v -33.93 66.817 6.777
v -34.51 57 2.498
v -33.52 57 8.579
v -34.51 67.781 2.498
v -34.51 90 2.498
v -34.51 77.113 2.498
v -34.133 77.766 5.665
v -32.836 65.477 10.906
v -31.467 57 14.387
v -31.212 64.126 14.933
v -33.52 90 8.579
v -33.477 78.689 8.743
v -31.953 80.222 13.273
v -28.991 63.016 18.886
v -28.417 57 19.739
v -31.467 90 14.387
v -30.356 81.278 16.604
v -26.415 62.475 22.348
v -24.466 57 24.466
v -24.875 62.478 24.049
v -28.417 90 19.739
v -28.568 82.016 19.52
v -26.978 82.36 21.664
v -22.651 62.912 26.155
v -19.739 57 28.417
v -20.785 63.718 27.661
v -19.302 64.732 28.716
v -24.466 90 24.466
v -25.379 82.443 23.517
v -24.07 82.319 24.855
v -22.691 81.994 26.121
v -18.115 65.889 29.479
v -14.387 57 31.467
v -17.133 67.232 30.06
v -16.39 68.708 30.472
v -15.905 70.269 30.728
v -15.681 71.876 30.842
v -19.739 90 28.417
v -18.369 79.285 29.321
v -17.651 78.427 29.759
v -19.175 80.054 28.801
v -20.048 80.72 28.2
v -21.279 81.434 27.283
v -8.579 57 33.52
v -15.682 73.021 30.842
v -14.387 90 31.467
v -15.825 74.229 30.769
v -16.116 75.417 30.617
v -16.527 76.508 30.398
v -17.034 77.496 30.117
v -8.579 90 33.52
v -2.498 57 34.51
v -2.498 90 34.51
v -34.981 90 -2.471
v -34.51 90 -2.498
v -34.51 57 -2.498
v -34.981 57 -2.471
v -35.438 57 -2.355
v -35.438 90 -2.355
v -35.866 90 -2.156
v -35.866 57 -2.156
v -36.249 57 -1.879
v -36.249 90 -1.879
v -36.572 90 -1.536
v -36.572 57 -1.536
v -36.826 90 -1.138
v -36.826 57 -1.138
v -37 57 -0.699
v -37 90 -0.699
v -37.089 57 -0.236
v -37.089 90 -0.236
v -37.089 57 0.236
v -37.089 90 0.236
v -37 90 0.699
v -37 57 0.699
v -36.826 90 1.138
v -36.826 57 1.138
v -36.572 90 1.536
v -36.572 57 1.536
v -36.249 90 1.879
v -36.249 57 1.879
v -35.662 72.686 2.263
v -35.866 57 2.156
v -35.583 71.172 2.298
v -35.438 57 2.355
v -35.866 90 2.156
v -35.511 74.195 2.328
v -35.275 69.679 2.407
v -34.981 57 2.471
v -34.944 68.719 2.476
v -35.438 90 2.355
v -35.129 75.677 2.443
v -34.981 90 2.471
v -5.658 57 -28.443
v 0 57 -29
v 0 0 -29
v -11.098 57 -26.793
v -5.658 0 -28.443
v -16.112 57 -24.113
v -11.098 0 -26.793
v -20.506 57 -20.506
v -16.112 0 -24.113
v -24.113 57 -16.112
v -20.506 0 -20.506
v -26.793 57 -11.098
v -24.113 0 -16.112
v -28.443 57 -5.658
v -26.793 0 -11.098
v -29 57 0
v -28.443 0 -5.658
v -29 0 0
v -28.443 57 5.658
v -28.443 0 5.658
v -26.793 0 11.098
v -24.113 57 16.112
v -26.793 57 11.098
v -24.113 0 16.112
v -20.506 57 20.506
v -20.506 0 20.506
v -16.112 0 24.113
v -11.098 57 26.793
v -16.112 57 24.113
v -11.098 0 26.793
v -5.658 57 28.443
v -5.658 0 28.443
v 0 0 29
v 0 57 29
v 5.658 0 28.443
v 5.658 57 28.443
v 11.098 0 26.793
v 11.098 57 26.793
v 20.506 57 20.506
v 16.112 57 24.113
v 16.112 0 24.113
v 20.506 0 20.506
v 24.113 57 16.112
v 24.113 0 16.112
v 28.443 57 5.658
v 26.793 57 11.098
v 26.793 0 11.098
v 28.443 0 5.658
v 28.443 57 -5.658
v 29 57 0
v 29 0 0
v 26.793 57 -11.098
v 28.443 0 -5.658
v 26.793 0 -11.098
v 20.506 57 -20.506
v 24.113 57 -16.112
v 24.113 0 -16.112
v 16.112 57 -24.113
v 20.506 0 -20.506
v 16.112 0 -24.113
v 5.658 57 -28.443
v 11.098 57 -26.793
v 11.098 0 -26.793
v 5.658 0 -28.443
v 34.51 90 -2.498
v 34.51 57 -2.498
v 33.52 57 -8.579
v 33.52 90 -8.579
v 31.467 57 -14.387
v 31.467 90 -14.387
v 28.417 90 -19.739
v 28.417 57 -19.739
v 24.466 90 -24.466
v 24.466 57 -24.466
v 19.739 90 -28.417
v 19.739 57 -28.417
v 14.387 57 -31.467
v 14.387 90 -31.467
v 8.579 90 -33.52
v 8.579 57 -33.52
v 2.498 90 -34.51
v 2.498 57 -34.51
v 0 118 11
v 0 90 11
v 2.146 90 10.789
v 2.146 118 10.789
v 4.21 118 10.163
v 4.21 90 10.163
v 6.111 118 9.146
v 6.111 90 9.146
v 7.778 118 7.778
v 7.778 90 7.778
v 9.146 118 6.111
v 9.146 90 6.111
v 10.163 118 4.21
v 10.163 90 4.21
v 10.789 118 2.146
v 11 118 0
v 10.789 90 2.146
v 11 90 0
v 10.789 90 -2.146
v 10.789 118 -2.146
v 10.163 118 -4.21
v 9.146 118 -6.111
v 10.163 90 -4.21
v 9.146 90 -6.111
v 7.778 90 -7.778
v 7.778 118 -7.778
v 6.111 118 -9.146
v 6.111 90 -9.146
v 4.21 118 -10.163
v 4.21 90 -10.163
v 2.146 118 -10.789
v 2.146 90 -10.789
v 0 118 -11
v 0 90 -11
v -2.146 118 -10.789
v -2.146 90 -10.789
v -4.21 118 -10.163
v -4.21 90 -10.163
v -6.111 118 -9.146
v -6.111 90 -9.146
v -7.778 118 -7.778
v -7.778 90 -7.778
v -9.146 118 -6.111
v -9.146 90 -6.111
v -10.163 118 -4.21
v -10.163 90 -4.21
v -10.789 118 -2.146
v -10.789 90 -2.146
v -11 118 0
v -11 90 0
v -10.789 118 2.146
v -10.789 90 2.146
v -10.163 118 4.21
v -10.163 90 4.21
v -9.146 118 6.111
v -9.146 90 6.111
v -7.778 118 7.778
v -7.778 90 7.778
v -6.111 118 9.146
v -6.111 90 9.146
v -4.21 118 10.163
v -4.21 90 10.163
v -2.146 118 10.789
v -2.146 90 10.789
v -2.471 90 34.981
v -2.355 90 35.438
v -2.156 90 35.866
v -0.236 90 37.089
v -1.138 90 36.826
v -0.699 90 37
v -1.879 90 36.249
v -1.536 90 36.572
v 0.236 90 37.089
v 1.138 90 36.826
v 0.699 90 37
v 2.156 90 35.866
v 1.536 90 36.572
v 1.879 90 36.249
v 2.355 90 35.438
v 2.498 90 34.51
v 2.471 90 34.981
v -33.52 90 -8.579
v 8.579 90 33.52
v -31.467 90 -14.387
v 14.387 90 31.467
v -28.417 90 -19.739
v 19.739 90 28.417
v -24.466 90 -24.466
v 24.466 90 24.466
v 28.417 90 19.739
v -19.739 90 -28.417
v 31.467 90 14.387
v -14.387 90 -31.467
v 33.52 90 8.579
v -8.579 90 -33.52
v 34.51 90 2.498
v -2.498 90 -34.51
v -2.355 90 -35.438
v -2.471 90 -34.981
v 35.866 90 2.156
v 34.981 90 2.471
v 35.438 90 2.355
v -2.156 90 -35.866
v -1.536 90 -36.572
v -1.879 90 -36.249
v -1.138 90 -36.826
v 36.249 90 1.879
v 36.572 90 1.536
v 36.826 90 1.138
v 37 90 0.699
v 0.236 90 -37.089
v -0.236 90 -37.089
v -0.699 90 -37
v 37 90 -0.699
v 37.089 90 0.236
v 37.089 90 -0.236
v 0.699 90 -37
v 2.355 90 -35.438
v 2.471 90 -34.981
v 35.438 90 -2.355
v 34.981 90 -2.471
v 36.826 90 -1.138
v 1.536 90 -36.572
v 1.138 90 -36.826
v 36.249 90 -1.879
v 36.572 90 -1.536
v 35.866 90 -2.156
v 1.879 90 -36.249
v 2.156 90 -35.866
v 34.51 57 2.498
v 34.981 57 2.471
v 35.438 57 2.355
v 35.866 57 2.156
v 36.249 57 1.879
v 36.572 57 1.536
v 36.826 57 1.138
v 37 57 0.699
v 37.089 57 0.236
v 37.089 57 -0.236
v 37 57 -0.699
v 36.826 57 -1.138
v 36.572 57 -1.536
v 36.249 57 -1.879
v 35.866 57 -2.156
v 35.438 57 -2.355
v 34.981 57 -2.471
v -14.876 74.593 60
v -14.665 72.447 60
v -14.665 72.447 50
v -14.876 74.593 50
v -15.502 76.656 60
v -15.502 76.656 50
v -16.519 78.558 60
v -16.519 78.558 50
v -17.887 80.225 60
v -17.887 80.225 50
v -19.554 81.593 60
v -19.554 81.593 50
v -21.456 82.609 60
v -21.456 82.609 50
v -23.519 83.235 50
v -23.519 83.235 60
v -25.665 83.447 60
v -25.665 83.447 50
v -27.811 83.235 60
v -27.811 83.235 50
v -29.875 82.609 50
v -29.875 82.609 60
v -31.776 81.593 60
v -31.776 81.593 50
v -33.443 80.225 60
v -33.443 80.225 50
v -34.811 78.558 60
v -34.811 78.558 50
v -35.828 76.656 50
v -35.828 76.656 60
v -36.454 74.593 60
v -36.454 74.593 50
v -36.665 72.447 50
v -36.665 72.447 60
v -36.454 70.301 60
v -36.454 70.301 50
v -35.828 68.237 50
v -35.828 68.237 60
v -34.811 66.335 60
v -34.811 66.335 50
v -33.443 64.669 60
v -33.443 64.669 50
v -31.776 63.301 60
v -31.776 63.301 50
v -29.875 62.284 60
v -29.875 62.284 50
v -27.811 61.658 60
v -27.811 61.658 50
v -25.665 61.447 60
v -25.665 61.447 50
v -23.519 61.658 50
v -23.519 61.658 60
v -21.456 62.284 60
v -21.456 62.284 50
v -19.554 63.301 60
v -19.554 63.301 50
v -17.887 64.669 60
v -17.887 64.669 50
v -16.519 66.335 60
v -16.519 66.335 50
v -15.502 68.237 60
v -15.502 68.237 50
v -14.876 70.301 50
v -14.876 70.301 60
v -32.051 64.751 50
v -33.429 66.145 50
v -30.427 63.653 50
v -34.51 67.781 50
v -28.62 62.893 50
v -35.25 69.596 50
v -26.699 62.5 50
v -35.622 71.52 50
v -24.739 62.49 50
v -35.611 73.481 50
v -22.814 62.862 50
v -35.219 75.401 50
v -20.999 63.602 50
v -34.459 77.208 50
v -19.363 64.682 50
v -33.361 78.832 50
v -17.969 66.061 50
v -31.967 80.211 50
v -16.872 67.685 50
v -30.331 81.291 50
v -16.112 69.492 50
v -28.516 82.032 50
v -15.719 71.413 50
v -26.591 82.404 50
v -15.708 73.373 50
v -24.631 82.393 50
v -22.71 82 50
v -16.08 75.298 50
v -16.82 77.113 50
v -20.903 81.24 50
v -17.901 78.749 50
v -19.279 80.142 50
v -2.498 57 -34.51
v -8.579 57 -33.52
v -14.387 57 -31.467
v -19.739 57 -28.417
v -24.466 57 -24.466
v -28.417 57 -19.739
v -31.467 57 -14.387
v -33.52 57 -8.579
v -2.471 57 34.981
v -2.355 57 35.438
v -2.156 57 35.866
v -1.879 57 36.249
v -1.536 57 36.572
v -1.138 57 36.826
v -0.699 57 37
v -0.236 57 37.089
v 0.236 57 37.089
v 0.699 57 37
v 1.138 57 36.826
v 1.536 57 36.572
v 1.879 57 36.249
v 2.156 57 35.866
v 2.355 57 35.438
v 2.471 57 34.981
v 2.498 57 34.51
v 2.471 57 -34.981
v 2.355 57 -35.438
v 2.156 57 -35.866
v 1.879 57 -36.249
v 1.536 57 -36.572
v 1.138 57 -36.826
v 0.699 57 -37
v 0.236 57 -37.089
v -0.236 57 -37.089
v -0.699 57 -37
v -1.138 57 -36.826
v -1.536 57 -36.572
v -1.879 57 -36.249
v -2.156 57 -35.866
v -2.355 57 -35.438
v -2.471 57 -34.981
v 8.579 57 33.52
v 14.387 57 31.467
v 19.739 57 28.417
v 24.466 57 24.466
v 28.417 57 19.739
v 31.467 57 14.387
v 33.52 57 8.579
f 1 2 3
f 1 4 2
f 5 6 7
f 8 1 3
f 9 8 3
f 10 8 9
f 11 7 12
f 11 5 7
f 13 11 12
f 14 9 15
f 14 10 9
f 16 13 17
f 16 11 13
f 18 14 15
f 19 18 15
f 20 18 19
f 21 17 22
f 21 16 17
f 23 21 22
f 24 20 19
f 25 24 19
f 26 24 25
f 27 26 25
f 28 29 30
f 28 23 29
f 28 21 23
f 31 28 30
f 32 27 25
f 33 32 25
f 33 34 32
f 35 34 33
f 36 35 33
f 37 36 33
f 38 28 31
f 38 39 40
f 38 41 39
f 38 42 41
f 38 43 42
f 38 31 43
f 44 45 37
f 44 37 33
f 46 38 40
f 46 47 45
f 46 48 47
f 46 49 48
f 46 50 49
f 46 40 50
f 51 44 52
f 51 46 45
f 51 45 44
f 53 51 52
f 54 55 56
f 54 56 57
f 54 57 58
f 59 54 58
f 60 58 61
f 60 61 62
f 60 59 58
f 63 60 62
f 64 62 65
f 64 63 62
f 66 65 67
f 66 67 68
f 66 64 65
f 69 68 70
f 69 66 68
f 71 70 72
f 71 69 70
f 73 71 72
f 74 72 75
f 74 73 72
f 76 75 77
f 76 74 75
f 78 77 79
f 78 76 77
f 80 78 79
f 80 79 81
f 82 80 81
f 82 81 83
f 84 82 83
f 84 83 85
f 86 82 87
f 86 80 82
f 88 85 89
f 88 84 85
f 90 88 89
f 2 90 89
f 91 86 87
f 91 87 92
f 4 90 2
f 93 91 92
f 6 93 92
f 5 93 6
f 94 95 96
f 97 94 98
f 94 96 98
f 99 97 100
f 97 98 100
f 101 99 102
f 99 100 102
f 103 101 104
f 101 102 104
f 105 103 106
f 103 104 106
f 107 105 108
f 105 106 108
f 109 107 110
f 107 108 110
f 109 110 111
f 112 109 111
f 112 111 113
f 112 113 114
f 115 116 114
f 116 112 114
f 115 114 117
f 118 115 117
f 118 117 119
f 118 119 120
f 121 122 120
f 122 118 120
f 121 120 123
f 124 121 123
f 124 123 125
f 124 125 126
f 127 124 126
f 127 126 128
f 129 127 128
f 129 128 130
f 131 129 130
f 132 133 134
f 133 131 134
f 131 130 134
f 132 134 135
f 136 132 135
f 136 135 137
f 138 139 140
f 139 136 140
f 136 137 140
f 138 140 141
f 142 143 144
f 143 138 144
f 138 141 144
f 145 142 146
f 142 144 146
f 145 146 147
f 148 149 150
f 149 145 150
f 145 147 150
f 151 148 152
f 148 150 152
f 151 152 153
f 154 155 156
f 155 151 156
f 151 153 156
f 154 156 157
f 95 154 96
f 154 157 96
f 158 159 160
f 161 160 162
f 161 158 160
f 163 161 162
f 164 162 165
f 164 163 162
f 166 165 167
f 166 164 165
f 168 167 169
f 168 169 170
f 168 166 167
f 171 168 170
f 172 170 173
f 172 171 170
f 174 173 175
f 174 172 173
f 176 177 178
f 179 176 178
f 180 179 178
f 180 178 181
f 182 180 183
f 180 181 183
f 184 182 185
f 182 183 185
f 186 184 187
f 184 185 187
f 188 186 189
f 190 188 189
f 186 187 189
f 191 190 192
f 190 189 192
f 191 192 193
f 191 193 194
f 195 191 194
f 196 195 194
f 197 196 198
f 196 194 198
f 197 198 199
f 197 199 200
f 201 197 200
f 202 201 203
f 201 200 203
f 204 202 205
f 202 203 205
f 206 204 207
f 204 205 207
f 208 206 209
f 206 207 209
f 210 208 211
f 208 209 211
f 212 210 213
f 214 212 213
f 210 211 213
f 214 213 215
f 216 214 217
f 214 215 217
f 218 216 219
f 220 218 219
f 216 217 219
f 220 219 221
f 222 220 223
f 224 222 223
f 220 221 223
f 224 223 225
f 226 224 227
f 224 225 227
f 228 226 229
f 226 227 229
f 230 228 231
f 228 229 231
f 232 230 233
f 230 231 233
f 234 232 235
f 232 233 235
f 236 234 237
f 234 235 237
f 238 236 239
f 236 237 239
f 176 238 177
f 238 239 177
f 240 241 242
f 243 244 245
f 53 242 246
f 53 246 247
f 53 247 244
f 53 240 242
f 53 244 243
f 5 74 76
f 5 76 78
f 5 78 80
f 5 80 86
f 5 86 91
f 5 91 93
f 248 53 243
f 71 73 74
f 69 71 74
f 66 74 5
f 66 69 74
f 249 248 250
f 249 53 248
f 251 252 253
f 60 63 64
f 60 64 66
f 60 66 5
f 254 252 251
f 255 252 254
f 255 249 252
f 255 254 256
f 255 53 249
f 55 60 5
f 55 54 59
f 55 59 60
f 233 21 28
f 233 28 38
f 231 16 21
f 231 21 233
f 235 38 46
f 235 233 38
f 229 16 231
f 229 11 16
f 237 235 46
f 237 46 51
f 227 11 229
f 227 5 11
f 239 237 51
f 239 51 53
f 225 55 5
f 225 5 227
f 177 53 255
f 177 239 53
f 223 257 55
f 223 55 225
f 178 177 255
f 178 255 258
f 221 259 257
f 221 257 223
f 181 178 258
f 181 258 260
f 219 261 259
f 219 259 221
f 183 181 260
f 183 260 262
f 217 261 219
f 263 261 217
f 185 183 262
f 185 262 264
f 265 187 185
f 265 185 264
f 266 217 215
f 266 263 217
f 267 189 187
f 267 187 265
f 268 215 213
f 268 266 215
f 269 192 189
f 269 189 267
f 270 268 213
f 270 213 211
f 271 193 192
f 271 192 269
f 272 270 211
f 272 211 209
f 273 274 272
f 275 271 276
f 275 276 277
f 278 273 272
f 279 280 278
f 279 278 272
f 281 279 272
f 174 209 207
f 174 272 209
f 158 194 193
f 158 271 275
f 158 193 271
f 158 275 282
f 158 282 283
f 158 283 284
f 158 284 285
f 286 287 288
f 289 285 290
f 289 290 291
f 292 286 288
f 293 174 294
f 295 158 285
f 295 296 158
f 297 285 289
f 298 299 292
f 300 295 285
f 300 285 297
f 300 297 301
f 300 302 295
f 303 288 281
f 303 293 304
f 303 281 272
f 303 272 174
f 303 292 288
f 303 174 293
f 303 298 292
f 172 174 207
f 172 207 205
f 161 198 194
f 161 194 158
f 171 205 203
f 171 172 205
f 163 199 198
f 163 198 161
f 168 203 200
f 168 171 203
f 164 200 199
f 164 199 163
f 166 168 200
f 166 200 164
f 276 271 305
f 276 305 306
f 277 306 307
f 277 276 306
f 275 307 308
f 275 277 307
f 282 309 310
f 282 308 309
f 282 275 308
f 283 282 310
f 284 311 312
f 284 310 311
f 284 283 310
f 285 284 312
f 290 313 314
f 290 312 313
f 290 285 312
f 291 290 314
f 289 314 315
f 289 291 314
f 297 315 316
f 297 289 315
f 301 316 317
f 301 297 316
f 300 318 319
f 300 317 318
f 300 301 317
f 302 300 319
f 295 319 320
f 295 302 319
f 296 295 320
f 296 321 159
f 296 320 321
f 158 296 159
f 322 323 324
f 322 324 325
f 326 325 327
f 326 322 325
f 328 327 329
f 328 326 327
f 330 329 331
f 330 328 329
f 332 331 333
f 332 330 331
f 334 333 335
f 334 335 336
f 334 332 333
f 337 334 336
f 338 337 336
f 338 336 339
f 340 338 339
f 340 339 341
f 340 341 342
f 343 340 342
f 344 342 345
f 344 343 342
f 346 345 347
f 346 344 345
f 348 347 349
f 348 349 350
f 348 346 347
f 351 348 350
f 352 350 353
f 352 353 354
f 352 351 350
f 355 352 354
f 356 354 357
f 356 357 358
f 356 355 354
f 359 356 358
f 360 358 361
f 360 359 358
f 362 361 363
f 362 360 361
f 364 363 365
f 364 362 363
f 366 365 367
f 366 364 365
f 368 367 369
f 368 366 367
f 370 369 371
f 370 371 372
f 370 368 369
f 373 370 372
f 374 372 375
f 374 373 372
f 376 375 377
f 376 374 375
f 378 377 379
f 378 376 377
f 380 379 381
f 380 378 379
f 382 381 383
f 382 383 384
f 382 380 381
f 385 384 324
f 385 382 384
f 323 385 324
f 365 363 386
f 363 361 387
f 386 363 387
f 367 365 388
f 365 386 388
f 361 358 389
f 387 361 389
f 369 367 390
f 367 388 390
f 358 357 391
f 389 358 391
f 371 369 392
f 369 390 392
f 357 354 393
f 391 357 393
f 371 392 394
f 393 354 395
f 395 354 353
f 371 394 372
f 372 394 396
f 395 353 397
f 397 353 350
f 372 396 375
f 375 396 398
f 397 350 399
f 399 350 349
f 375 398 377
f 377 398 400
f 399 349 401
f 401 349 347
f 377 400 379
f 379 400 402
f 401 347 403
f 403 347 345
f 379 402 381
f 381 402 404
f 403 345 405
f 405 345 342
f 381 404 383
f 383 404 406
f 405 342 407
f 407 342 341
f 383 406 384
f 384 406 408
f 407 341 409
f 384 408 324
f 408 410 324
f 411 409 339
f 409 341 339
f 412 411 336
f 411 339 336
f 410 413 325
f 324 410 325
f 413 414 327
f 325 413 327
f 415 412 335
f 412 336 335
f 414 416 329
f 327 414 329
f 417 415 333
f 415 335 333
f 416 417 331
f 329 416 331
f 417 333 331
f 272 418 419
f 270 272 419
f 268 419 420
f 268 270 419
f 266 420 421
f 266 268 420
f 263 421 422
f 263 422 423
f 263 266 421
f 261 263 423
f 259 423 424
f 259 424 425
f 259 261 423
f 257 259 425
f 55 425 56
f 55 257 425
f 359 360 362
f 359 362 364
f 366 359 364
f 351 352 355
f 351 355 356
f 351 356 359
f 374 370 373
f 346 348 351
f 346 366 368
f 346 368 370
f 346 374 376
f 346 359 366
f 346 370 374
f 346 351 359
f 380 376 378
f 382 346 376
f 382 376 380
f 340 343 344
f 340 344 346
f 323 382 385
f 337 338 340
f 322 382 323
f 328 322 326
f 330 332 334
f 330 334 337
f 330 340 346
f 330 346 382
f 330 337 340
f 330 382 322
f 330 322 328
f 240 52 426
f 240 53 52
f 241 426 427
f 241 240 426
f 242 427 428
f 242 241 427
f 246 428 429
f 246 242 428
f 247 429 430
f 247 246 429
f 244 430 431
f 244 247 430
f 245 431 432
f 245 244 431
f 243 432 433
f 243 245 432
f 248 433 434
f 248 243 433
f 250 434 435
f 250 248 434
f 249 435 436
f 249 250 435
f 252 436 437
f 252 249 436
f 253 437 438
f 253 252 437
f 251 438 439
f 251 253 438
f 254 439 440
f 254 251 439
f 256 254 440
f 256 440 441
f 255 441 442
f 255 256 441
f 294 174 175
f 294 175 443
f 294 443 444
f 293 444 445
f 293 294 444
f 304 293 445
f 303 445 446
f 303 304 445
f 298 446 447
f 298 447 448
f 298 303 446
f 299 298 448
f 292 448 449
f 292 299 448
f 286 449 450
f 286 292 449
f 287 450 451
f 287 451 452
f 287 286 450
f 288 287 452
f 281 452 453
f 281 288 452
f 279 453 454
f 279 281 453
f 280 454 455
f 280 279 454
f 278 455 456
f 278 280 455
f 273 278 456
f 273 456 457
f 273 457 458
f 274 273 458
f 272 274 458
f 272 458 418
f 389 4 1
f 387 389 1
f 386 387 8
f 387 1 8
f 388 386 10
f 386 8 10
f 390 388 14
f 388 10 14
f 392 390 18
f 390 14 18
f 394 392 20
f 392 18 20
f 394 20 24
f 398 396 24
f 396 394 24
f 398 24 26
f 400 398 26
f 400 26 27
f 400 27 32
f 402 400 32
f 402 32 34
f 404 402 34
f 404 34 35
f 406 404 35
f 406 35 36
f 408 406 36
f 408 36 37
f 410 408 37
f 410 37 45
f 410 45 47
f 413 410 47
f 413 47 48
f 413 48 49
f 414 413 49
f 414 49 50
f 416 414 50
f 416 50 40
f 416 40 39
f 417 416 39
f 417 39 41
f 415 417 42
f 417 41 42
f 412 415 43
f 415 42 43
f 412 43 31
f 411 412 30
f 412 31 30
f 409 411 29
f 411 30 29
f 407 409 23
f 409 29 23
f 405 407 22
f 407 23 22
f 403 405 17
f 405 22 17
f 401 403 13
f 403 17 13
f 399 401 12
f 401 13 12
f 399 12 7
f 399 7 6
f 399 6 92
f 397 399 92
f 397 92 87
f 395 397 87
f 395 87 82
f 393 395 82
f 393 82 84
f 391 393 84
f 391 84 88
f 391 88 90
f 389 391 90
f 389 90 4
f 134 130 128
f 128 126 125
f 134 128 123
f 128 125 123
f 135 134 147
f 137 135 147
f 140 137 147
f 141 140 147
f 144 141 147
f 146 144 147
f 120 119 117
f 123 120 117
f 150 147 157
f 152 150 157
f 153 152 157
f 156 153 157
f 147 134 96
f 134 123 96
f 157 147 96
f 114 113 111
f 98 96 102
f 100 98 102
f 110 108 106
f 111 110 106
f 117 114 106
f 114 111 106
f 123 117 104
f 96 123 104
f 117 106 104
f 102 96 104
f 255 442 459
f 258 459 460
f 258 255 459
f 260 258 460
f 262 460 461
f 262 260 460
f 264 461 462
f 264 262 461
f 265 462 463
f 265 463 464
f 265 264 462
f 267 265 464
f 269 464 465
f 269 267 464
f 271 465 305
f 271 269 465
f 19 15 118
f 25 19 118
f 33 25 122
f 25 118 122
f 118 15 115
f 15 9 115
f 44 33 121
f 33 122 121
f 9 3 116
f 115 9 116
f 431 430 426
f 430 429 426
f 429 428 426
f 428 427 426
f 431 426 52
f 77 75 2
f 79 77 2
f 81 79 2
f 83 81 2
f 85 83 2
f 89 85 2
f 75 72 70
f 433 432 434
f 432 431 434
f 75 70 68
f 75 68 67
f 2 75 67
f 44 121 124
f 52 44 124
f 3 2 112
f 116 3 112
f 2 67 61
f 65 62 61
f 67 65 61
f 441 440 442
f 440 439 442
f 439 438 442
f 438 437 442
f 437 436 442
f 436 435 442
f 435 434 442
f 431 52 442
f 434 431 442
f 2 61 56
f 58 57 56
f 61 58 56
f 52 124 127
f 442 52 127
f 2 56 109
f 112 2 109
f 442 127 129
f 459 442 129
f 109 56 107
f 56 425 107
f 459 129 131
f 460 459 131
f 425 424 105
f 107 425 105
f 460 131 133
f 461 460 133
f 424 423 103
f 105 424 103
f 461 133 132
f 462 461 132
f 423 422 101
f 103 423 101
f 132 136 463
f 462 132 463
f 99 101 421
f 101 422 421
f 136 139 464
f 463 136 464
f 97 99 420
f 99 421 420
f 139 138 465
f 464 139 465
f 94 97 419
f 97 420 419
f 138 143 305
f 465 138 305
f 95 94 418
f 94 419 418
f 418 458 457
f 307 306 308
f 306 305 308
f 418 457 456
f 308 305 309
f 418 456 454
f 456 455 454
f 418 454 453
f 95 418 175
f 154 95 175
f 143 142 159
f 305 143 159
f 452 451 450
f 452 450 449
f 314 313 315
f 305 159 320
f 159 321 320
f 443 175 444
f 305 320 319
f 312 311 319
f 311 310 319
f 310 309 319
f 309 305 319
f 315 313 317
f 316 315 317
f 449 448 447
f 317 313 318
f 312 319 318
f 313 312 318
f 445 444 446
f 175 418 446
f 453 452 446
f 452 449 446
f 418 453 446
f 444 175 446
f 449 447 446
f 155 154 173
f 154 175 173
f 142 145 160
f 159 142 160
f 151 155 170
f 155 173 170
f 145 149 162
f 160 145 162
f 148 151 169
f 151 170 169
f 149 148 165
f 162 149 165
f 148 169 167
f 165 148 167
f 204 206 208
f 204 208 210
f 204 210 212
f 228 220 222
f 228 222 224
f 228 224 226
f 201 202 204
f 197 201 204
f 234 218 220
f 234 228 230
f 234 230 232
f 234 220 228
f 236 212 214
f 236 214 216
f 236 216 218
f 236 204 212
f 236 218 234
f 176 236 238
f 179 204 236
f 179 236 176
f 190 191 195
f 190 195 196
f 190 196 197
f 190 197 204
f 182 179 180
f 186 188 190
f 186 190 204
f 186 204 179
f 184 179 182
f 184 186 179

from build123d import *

# Parameters (mm, degrees)
SKETCH1_R           = 29
BOSS_EXTRUDE1_DEPTH = 90
SKETCH2_R           = 11
BOSS_EXTRUDE2_DEPTH = 28
SKETCH3_R           = 34.6
BOSS_EXTRUDE3_DEPTH = 33
SKETCH4_R           = 2.5
BOSS_EXTRUDE4_DEPTH = 33
SKETCH5_R           = 10
BOSS_EXTRUDE5_DEPTH = 60
SKETCH6_R           = 11
BOSS_EXTRUDE6_DEPTH = 10


with BuildPart() as part:
    # Sketch1 → Boss-Extrude1 (new body)
    with BuildSketch(Plane(origin=(0, 0, 0), x_dir=(1, 0, 0), z_dir=(0, 1, 0))):
        with Locations(Location((0, 0, 0), (0, 0, 90))):
            Circle(SKETCH1_R)
    extrude(amount=BOSS_EXTRUDE1_DEPTH)

    # Sketch2 → Boss-Extrude2 (add)
    with BuildSketch(Plane(origin=(0, 90, 0), x_dir=(1, 0, 0), z_dir=(0, 1, 0))):
        with Locations(Location((0, 0, 0), (0, 0, 270))):
            Circle(SKETCH2_R)
    extrude(amount=BOSS_EXTRUDE2_DEPTH)

    # Sketch3 → Boss-Extrude3 (add)
    with BuildSketch(Plane(origin=(0, 90, 0), x_dir=(1, 0, 0), z_dir=(0, 1, 0))):
        with Locations(Location((0, 0, 0), (0, 0, 270))):
            Circle(SKETCH3_R)
    extrude(amount=-BOSS_EXTRUDE3_DEPTH)

    # Sketch4 → Boss-Extrude4 (add)
    with BuildSketch(Plane(origin=(0, 90, 0), x_dir=(1, 0, 0), z_dir=(0, 1, 0))):
        with Locations((0, 34.6)):
            Circle(SKETCH4_R)
        with Locations((-34.6, 0)):
            Circle(SKETCH4_R)
        with Locations((0, -34.6)):
            Circle(SKETCH4_R)
        with Locations((34.6, 0)):
            Circle(SKETCH4_R)
    extrude(amount=-BOSS_EXTRUDE4_DEPTH)

    # Sketch5 → Boss-Extrude5 (add)
    with BuildSketch(Plane.XY):
        with Locations(Location((-25.665087219, 72.446676229, 0), (0, 0, 207.814921286))):
            Circle(SKETCH5_R)
    extrude(amount=BOSS_EXTRUDE5_DEPTH)

    # Sketch6 → Boss-Extrude6 (add)
    with BuildSketch(Plane.XY.offset(60)):
        with Locations((-25.665087219, 72.446676229)):
            Circle(SKETCH6_R)
    extrude(amount=-BOSS_EXTRUDE6_DEPTH)


solid = part.part
